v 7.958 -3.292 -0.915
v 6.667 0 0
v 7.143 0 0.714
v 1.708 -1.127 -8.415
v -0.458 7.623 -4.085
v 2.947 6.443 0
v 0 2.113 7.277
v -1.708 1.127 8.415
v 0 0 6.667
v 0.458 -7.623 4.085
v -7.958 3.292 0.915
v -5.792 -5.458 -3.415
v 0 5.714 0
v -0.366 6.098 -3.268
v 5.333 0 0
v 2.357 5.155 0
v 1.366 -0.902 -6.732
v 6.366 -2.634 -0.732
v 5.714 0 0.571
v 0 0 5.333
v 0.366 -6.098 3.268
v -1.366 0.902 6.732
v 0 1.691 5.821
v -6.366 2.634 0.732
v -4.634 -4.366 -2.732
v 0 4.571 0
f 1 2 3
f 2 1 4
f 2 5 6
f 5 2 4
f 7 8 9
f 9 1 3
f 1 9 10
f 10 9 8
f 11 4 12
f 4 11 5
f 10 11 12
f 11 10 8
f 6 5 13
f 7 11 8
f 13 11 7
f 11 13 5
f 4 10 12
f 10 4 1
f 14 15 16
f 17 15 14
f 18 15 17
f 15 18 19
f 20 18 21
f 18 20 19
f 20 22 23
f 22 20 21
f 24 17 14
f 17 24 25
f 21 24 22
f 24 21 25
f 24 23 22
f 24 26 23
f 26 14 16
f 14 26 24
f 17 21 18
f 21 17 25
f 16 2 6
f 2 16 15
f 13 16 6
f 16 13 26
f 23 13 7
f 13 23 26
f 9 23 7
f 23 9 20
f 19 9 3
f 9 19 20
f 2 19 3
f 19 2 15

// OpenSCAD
difference() {
 rotate([30,30,30]) difference() {
  cube(size=10.0,center=true);
  cube(size=8.0,center=true);
 }
 cube(size=10.0,center=false);
}
